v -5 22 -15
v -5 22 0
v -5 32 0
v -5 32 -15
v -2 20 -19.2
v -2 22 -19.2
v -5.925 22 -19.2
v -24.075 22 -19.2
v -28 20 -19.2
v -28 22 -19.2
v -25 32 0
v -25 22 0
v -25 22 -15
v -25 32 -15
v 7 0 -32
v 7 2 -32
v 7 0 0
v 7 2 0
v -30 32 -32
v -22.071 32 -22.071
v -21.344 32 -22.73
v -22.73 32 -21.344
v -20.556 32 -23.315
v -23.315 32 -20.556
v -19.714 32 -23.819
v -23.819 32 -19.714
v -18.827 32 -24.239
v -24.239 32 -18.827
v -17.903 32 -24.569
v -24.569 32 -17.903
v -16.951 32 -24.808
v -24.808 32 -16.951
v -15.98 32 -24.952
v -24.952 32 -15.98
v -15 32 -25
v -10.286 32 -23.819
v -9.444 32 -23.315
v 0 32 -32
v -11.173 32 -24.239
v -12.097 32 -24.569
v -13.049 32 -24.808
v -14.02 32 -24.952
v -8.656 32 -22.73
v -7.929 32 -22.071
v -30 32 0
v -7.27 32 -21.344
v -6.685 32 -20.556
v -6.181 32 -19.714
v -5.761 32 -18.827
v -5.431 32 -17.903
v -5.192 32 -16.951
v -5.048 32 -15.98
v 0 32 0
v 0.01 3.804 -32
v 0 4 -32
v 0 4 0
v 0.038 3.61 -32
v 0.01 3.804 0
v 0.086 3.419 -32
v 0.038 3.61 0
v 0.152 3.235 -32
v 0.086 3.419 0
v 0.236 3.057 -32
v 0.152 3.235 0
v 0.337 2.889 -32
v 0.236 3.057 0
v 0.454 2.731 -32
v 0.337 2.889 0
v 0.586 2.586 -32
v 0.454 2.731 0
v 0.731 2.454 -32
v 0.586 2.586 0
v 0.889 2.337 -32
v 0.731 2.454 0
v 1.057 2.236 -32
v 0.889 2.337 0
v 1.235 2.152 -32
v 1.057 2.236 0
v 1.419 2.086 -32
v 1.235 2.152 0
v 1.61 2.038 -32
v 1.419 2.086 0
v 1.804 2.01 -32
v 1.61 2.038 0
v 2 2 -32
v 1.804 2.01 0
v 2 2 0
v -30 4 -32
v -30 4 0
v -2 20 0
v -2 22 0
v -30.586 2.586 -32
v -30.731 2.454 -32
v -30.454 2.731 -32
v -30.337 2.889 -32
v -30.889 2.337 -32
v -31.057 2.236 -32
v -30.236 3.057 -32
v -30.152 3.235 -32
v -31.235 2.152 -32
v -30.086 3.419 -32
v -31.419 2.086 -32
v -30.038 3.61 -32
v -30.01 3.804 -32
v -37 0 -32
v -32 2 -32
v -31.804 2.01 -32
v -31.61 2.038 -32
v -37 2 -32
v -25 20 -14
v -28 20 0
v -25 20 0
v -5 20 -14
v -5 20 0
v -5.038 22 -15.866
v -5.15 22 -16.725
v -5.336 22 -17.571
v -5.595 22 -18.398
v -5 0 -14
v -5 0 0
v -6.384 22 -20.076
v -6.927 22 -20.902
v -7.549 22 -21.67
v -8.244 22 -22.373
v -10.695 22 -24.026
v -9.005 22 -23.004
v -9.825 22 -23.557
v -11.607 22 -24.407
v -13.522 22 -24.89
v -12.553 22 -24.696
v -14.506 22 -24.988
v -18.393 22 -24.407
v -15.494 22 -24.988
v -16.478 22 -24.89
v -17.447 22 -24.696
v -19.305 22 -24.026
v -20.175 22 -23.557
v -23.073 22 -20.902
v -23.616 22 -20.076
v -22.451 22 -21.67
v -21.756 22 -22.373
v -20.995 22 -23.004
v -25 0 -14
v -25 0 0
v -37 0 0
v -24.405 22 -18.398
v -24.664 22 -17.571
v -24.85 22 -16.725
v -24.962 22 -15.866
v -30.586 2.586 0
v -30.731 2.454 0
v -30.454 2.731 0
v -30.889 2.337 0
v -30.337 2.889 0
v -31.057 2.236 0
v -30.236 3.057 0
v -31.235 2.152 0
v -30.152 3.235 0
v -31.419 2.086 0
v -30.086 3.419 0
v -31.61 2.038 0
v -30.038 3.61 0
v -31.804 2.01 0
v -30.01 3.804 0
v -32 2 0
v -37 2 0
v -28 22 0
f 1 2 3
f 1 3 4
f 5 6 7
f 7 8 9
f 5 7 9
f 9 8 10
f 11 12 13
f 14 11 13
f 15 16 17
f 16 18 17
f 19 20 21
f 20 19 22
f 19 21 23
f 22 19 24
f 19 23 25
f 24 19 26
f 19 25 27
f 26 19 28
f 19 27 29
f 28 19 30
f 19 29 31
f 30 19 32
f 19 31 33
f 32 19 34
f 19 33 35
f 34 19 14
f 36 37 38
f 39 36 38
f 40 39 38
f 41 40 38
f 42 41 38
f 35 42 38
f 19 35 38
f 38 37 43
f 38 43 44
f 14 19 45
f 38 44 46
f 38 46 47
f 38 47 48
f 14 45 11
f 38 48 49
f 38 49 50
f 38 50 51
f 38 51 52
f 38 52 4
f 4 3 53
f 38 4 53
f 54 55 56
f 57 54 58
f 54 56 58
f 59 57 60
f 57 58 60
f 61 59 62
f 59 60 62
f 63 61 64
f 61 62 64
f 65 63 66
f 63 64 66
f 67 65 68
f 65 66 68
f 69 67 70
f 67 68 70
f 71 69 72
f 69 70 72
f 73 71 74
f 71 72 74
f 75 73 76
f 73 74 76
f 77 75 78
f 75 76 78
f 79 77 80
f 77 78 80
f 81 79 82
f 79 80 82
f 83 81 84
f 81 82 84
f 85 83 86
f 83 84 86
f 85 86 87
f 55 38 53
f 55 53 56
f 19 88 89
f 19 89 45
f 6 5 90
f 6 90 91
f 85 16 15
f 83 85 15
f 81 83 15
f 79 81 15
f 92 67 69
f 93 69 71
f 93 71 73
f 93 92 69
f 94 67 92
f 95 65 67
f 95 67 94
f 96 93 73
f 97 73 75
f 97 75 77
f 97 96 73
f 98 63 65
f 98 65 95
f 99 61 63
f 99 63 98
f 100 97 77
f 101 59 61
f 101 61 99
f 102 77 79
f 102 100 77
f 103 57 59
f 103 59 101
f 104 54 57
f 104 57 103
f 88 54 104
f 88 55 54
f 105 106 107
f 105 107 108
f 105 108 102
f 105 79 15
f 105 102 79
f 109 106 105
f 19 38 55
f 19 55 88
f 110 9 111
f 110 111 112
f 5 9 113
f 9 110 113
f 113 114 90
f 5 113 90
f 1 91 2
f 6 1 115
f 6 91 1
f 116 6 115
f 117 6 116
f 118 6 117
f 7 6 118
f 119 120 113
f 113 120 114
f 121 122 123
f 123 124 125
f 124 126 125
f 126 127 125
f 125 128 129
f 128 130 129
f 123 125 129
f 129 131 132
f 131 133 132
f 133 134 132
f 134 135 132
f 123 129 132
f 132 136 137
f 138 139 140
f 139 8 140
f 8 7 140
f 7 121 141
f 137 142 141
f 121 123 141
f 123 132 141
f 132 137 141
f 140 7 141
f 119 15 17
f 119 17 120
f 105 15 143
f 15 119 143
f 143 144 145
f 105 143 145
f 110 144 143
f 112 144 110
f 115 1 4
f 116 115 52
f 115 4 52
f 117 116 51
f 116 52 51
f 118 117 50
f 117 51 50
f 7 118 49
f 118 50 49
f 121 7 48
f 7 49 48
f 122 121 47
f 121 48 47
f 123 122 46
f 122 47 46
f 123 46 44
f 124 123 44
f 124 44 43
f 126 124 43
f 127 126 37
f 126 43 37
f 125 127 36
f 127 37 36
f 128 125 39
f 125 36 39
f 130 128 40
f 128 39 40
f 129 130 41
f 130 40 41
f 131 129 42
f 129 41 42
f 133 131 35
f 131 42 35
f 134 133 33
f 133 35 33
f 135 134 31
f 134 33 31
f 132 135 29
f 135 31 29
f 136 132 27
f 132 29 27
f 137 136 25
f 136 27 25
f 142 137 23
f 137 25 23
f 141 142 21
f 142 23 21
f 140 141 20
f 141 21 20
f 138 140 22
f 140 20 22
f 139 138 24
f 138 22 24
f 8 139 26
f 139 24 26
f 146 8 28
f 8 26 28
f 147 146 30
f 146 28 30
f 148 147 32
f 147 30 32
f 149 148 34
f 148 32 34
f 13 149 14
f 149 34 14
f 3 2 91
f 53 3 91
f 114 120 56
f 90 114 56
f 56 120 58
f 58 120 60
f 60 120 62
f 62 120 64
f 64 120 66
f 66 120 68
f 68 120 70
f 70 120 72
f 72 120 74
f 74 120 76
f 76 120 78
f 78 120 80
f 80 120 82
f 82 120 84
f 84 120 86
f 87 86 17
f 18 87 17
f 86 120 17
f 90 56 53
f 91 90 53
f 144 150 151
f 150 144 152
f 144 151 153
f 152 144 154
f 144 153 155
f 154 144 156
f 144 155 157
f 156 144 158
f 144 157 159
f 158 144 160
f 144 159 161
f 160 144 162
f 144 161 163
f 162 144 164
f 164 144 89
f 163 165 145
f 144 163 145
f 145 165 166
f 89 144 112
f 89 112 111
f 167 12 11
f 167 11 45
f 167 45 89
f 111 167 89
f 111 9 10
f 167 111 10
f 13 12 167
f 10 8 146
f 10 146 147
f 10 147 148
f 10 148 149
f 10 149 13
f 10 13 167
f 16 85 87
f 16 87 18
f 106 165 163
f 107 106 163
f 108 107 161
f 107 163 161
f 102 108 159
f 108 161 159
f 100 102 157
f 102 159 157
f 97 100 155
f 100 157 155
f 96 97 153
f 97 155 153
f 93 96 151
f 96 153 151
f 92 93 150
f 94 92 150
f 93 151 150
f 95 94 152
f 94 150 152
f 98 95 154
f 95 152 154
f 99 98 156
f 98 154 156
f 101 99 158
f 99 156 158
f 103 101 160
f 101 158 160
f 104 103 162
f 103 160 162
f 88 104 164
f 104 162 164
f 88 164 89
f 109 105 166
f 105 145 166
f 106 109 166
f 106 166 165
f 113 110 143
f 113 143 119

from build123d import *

# Parameters (mm, degrees)
SKETCH1_W           = 30
SKETCH1_H           = 28
BOSS_EXTRUDE1_DEPTH = 20
SKETCH2_W           = 5
SKETCH2_H           = 28
BOSS_EXTRUDE2_DEPTH = 12
SKETCH3_W           = 3
SKETCH3_H           = 2
CUT_EXTRUDE1_DEPTH  = 53.038447325
SKETCH4_W           = 20
SKETCH4_H           = 20
CUT_EXTRUDE2_DEPTH  = 14
SKETCH5_W           = 7
SKETCH5_H           = 2
BOSS_EXTRUDE3_DEPTH = 28
FILLET1_R           = 2
BOSS_EXTRUDE5_DEPTH = 10
SKETCH8_W           = 26
SKETCH8_H           = 2
BOSS_EXTRUDE6_DEPTH = 8.8
BOSS_EXTRUDE7_DEPTH = 4


with BuildPart() as part:
    # Sketch1 → Boss-Extrude1 (new body)
    with BuildSketch(Plane(origin=(0, 0, 0), x_dir=(1, 0, 0), z_dir=(0, 1, 0))):
        with Locations((-15, 14)):
            Rectangle(SKETCH1_W, SKETCH1_H)
    extrude(amount=BOSS_EXTRUDE1_DEPTH)

    # Sketch2 → Boss-Extrude2 (add)
    with BuildSketch(Plane(origin=(0, 20, 0), x_dir=(1, 0, 0), z_dir=(0, 1, 0))):
        with Locations((-27.5, 14)):
            Rectangle(SKETCH2_W, SKETCH2_H)
        with Locations((-2.5, 14)):
            Rectangle(SKETCH2_W, SKETCH2_H)
    extrude(amount=BOSS_EXTRUDE2_DEPTH)

    # Sketch3 → Cut-Extrude1 (cut, through all)
    with BuildSketch(Plane.XY):
        with Locations((-3.5, 21)):
            Rectangle(SKETCH3_W, SKETCH3_H)
        with Locations((-26.5, 21)):
            Rectangle(SKETCH3_W, SKETCH3_H)
    extrude(amount=-CUT_EXTRUDE1_DEPTH, mode=Mode.SUBTRACT)

    # Sketch4 → Cut-Extrude2 (cut)
    with BuildSketch(Plane.XY):
        with Locations((-15, 10)):
            Rectangle(SKETCH4_W, SKETCH4_H)
    extrude(amount=-CUT_EXTRUDE2_DEPTH, mode=Mode.SUBTRACT)

    # Sketch5 → Boss-Extrude3 (add)
    with BuildSketch(Plane(origin=(0, 0, -28), x_dir=(-1, 0, 0), z_dir=(0, 0, -1))):
        with Locations((33.5, 1)):
            Rectangle(SKETCH5_W, SKETCH5_H)
        with Locations((-3.5, 1)):
            Rectangle(SKETCH5_W, SKETCH5_H)
    extrude(amount=-BOSS_EXTRUDE3_DEPTH)

    # Fillet1
    fillet1_edges = [part.edges().sort_by_distance(p)[0] for p in [
        (-30, 2, -14),
        (0, 2, -14),
    ]]
    fillet(fillet1_edges, radius=FILLET1_R)

    # Sketch7 → Boss-Extrude5 (add)
    with BuildSketch(Plane(origin=(0, 32, 0), x_dir=(1, 0, 0), z_dir=(0, 1, 0))):
        with BuildLine():
            Line((-25, 15), (-25, 28))
            Line((-25, 28), (-5, 28))
            Line((-5, 28), (-5, 15))
            ThreePointArc((-5, 15), (-15, 25), (-25, 15))
        make_face()
    extrude(amount=-BOSS_EXTRUDE5_DEPTH)

    # Sketch8 → Boss-Extrude6 (add)
    with BuildSketch(Plane(origin=(0, 0, -28), x_dir=(-1, 0, 0), z_dir=(0, 0, -1))):
        with Locations((15, 21)):
            Rectangle(SKETCH8_W, SKETCH8_H)
    extrude(amount=-BOSS_EXTRUDE6_DEPTH)

    # Sketch10 → Boss-Extrude7 (add)
    with BuildSketch(Plane(origin=(0, 0, -28), x_dir=(-1, 0, 0), z_dir=(0, 0, -1))):
        with BuildLine():
            Line((30, 4), (30, 32))
            Line((30, 32), (0, 32))
            Line((0, 32), (0, 4))
            ThreePointArc((0, 4), (-0.585786438, 2.585786438), (-2, 2))
            Line((-2, 2), (-7, 2))
            Line((-7, 2), (-7, 0))
            Line((-7, 0), (37, 0))
            Line((37, 0), (37, 2))
            Line((37, 2), (32, 2))
            ThreePointArc((32, 2), (30.585786438, 2.585786438), (30, 4))
        make_face()
    extrude(amount=BOSS_EXTRUDE7_DEPTH)


solid = part.part
